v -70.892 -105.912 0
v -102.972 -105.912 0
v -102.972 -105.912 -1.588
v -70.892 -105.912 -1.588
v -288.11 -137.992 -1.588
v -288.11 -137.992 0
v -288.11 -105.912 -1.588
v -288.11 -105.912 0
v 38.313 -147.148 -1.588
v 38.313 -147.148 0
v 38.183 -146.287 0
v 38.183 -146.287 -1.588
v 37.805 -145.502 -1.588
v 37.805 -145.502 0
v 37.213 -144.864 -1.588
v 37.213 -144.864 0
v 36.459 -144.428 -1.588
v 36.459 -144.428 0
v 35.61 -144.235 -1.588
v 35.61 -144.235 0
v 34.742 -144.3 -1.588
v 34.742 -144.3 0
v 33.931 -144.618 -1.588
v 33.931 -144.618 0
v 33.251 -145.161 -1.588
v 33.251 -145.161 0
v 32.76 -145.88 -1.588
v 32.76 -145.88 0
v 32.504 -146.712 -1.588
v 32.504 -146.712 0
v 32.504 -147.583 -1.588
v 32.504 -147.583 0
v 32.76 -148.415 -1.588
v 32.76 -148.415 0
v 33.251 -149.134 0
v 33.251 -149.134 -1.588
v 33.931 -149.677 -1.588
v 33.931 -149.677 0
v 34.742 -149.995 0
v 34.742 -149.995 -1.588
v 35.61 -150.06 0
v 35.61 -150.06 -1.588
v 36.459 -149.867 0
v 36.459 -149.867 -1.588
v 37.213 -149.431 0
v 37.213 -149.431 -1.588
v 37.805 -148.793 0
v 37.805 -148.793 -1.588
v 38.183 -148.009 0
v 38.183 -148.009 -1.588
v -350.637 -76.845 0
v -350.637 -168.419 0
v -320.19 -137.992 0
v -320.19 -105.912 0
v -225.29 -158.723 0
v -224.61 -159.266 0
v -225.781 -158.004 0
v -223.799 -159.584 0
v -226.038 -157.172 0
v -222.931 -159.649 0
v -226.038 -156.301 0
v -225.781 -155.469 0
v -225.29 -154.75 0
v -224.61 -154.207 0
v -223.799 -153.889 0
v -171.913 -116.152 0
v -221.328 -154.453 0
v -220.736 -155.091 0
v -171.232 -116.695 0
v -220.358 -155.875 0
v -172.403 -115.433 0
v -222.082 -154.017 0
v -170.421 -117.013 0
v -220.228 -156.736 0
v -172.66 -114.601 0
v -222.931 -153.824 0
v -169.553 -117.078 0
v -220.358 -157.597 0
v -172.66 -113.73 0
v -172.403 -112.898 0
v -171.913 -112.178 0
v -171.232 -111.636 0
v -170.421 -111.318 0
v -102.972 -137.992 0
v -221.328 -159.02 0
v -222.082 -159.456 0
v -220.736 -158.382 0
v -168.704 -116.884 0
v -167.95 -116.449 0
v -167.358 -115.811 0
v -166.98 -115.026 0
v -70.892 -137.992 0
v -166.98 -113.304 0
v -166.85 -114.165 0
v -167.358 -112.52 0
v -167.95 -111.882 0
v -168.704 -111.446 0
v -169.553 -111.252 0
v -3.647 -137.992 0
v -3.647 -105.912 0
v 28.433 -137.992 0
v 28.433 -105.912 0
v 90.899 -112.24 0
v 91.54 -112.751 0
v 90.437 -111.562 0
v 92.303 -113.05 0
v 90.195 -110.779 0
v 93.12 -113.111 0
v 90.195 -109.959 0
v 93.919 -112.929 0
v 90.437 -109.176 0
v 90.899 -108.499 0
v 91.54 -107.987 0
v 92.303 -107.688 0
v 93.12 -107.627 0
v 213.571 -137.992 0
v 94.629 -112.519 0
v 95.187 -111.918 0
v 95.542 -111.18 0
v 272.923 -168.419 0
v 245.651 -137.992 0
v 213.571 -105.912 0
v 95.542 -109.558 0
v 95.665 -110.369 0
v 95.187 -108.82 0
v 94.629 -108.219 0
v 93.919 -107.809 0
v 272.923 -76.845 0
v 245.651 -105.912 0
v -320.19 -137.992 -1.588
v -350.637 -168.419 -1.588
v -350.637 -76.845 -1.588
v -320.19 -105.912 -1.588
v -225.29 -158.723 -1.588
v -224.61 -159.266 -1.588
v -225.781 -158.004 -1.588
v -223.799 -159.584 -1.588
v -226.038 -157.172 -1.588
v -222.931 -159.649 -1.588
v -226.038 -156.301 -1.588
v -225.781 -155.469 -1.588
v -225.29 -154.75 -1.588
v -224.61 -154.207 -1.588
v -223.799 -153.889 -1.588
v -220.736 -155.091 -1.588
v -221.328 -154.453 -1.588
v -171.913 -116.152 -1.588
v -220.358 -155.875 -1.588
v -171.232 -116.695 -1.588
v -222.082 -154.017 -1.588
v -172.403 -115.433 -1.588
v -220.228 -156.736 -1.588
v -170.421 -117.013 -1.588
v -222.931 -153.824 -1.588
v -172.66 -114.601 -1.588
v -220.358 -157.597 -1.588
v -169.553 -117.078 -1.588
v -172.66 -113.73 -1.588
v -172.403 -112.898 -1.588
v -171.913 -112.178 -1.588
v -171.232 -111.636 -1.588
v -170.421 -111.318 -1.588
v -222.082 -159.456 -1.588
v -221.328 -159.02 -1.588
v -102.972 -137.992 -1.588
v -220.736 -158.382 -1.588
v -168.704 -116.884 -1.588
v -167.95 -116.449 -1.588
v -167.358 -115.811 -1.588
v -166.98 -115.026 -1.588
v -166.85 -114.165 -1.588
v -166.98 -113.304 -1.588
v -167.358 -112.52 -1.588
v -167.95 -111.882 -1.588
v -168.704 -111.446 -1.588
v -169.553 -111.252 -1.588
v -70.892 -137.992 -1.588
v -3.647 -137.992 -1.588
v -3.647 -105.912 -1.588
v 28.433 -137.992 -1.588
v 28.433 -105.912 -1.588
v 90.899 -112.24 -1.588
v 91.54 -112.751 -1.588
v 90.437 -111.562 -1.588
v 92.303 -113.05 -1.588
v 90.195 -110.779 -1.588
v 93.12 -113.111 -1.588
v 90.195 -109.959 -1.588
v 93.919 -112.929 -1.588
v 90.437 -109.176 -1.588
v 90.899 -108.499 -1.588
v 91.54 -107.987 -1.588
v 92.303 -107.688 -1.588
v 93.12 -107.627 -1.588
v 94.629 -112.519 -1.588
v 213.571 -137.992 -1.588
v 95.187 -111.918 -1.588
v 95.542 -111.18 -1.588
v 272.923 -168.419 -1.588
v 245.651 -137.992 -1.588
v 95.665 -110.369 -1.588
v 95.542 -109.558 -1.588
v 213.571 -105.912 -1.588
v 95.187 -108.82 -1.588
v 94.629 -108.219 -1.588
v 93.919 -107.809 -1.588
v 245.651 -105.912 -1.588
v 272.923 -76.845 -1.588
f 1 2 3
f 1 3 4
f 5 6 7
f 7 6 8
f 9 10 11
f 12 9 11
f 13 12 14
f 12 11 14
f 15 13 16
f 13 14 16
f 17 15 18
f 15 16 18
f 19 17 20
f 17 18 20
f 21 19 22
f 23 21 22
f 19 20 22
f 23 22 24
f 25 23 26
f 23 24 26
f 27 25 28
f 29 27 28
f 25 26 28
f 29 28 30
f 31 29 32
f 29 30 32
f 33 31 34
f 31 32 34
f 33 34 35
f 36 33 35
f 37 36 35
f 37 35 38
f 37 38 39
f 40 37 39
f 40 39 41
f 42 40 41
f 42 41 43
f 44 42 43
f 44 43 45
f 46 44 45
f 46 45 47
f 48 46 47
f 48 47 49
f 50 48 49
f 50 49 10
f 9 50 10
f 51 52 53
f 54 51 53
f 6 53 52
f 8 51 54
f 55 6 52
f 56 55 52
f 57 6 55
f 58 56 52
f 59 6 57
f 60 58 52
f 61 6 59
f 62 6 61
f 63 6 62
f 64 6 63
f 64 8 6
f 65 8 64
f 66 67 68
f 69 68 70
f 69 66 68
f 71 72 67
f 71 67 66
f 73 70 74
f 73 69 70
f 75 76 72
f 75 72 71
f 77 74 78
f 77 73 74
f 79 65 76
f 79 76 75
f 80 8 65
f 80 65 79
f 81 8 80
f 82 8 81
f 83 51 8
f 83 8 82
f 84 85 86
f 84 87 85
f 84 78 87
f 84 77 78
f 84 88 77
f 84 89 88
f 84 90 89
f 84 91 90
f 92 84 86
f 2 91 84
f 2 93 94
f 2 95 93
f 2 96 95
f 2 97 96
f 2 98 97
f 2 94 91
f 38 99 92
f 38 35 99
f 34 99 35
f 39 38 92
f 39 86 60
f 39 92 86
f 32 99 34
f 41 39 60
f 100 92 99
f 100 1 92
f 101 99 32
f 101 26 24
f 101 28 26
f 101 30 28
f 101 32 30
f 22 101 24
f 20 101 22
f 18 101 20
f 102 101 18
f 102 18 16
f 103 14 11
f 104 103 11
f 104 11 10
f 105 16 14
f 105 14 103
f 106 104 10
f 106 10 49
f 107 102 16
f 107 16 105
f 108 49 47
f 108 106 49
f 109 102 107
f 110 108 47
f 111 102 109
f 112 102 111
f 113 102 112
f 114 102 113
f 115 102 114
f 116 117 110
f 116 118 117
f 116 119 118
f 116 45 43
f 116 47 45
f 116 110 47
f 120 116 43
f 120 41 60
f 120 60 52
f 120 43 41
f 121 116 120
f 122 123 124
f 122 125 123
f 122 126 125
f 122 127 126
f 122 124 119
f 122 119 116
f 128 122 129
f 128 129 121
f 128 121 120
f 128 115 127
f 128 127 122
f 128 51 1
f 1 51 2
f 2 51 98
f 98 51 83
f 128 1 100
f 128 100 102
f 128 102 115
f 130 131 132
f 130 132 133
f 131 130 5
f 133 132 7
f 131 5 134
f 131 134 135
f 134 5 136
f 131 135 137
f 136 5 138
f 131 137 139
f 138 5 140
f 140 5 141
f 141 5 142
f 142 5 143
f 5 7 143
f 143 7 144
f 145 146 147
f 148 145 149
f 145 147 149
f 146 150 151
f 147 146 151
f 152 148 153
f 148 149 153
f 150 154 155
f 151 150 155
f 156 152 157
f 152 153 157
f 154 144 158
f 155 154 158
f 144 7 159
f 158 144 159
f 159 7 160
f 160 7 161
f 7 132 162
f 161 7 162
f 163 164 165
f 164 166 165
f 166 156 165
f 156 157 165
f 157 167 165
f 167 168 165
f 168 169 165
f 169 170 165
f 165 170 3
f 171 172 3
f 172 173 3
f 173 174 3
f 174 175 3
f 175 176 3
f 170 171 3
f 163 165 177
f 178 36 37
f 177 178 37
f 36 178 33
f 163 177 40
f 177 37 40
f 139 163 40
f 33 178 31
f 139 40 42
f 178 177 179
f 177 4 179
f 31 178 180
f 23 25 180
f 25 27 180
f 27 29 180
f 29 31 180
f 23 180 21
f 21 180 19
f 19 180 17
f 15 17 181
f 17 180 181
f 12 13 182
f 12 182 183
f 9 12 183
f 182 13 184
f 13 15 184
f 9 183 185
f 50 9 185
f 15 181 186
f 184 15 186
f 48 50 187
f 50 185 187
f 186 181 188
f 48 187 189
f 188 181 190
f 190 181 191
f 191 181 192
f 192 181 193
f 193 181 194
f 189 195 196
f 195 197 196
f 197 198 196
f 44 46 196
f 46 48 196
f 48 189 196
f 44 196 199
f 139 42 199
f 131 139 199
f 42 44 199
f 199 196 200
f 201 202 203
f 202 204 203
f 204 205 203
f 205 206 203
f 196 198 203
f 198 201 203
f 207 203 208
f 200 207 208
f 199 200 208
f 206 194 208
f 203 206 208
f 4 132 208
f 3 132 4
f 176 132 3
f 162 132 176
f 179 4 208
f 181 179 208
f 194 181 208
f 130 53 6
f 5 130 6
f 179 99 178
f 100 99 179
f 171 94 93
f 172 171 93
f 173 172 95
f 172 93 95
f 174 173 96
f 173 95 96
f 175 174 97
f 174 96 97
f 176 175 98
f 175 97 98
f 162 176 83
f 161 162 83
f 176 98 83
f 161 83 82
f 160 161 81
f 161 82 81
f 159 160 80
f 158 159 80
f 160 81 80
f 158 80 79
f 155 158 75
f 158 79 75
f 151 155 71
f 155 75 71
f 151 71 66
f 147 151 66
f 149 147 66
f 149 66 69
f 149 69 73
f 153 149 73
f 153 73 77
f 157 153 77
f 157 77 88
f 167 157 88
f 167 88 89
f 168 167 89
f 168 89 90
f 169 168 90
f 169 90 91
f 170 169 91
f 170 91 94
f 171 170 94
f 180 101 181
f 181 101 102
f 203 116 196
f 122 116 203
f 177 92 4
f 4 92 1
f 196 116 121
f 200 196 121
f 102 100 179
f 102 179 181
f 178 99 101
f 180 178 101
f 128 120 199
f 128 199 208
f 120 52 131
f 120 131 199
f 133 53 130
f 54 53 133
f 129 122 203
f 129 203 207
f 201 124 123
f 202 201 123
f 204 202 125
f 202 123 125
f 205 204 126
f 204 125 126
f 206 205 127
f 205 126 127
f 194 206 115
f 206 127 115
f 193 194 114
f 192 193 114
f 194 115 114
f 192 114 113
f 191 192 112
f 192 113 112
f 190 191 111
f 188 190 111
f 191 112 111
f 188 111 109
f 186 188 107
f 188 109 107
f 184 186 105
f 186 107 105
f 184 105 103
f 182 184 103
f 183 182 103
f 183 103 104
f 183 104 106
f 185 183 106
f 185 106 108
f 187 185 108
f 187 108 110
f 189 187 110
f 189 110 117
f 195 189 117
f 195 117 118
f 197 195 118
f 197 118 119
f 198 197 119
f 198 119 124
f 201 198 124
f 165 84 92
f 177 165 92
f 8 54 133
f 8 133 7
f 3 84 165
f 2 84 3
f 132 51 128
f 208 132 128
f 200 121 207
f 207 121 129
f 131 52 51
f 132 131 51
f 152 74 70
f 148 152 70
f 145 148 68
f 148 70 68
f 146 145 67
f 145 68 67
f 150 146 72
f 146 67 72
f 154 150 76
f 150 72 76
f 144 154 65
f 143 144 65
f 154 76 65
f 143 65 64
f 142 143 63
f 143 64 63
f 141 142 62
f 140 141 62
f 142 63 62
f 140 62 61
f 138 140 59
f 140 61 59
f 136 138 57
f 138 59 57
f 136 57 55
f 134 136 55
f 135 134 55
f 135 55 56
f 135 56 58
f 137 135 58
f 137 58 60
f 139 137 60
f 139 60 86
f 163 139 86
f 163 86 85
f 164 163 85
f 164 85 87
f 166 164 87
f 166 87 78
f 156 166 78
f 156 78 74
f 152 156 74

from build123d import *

# Parameters (mm, degrees)
SKETCH1_W           = 623.55984
SKETCH1_H           = 78.16342
BASE_FLANGE1_DEPTH  = 1.5875
SKETCH3_R           = 2.75
SKETCH3_R_2         = 2.921
SKETCH3_W           = 32.08
SKETCH3_H           = 32.08
CUT_EXTRUDE3_DEPTH  = 389.990867909
SKETCH6_W           = 623.55984
SKETCH6_H           = 13.4112
BOSS_EXTRUDE1_DEPTH = 1.5875


# Sheet-metal steps are written as plain solids
with BuildPart() as part:
    # Sketch1 → Base-Flange1 (new body)
    with BuildSketch(Plane.XY):
        with Locations((-38.857061865, -129.337653818)):
            Rectangle(SKETCH1_W, SKETCH1_H)
    extrude(amount=-BASE_FLANGE1_DEPTH)

    # Sketch3 → Cut-Extrude3 (cut, through all)
    with BuildSketch(Plane.XY):
        with Locations((92.914515529, -110.369060902)):
            Circle(SKETCH3_R)
        with Locations((35.391947046, -147.147547142)):
            Circle(SKETCH3_R_2)
        with Locations((-169.771284735, -114.165270711)):
            Circle(SKETCH3_R_2)
        with Locations((-223.149152531, -156.736460083)):
            Circle(SKETCH3_R_2)
        with Locations((-304.149901865, -121.952427932)):
            Rectangle(SKETCH3_W, SKETCH3_H)
        with Locations((-86.931641865, -121.952427932)):
            Rectangle(SKETCH3_W, SKETCH3_H)
        with Locations((12.392518135, -121.952427932)):
            Rectangle(SKETCH3_W, SKETCH3_H)
        with Locations((229.610778135, -121.952427932)):
            Rectangle(SKETCH3_W, SKETCH3_H)
    extrude(amount=-CUT_EXTRUDE3_DEPTH, mode=Mode.SUBTRACT)

    # Sketch6 → Boss-Extrude1 (add, through all)
    with BuildSketch(Plane.XY):
        with Locations((-38.857061865, -83.550343818)):
            Rectangle(SKETCH6_W, SKETCH6_H)
    extrude(amount=-BOSS_EXTRUDE1_DEPTH)


solid = part.part
